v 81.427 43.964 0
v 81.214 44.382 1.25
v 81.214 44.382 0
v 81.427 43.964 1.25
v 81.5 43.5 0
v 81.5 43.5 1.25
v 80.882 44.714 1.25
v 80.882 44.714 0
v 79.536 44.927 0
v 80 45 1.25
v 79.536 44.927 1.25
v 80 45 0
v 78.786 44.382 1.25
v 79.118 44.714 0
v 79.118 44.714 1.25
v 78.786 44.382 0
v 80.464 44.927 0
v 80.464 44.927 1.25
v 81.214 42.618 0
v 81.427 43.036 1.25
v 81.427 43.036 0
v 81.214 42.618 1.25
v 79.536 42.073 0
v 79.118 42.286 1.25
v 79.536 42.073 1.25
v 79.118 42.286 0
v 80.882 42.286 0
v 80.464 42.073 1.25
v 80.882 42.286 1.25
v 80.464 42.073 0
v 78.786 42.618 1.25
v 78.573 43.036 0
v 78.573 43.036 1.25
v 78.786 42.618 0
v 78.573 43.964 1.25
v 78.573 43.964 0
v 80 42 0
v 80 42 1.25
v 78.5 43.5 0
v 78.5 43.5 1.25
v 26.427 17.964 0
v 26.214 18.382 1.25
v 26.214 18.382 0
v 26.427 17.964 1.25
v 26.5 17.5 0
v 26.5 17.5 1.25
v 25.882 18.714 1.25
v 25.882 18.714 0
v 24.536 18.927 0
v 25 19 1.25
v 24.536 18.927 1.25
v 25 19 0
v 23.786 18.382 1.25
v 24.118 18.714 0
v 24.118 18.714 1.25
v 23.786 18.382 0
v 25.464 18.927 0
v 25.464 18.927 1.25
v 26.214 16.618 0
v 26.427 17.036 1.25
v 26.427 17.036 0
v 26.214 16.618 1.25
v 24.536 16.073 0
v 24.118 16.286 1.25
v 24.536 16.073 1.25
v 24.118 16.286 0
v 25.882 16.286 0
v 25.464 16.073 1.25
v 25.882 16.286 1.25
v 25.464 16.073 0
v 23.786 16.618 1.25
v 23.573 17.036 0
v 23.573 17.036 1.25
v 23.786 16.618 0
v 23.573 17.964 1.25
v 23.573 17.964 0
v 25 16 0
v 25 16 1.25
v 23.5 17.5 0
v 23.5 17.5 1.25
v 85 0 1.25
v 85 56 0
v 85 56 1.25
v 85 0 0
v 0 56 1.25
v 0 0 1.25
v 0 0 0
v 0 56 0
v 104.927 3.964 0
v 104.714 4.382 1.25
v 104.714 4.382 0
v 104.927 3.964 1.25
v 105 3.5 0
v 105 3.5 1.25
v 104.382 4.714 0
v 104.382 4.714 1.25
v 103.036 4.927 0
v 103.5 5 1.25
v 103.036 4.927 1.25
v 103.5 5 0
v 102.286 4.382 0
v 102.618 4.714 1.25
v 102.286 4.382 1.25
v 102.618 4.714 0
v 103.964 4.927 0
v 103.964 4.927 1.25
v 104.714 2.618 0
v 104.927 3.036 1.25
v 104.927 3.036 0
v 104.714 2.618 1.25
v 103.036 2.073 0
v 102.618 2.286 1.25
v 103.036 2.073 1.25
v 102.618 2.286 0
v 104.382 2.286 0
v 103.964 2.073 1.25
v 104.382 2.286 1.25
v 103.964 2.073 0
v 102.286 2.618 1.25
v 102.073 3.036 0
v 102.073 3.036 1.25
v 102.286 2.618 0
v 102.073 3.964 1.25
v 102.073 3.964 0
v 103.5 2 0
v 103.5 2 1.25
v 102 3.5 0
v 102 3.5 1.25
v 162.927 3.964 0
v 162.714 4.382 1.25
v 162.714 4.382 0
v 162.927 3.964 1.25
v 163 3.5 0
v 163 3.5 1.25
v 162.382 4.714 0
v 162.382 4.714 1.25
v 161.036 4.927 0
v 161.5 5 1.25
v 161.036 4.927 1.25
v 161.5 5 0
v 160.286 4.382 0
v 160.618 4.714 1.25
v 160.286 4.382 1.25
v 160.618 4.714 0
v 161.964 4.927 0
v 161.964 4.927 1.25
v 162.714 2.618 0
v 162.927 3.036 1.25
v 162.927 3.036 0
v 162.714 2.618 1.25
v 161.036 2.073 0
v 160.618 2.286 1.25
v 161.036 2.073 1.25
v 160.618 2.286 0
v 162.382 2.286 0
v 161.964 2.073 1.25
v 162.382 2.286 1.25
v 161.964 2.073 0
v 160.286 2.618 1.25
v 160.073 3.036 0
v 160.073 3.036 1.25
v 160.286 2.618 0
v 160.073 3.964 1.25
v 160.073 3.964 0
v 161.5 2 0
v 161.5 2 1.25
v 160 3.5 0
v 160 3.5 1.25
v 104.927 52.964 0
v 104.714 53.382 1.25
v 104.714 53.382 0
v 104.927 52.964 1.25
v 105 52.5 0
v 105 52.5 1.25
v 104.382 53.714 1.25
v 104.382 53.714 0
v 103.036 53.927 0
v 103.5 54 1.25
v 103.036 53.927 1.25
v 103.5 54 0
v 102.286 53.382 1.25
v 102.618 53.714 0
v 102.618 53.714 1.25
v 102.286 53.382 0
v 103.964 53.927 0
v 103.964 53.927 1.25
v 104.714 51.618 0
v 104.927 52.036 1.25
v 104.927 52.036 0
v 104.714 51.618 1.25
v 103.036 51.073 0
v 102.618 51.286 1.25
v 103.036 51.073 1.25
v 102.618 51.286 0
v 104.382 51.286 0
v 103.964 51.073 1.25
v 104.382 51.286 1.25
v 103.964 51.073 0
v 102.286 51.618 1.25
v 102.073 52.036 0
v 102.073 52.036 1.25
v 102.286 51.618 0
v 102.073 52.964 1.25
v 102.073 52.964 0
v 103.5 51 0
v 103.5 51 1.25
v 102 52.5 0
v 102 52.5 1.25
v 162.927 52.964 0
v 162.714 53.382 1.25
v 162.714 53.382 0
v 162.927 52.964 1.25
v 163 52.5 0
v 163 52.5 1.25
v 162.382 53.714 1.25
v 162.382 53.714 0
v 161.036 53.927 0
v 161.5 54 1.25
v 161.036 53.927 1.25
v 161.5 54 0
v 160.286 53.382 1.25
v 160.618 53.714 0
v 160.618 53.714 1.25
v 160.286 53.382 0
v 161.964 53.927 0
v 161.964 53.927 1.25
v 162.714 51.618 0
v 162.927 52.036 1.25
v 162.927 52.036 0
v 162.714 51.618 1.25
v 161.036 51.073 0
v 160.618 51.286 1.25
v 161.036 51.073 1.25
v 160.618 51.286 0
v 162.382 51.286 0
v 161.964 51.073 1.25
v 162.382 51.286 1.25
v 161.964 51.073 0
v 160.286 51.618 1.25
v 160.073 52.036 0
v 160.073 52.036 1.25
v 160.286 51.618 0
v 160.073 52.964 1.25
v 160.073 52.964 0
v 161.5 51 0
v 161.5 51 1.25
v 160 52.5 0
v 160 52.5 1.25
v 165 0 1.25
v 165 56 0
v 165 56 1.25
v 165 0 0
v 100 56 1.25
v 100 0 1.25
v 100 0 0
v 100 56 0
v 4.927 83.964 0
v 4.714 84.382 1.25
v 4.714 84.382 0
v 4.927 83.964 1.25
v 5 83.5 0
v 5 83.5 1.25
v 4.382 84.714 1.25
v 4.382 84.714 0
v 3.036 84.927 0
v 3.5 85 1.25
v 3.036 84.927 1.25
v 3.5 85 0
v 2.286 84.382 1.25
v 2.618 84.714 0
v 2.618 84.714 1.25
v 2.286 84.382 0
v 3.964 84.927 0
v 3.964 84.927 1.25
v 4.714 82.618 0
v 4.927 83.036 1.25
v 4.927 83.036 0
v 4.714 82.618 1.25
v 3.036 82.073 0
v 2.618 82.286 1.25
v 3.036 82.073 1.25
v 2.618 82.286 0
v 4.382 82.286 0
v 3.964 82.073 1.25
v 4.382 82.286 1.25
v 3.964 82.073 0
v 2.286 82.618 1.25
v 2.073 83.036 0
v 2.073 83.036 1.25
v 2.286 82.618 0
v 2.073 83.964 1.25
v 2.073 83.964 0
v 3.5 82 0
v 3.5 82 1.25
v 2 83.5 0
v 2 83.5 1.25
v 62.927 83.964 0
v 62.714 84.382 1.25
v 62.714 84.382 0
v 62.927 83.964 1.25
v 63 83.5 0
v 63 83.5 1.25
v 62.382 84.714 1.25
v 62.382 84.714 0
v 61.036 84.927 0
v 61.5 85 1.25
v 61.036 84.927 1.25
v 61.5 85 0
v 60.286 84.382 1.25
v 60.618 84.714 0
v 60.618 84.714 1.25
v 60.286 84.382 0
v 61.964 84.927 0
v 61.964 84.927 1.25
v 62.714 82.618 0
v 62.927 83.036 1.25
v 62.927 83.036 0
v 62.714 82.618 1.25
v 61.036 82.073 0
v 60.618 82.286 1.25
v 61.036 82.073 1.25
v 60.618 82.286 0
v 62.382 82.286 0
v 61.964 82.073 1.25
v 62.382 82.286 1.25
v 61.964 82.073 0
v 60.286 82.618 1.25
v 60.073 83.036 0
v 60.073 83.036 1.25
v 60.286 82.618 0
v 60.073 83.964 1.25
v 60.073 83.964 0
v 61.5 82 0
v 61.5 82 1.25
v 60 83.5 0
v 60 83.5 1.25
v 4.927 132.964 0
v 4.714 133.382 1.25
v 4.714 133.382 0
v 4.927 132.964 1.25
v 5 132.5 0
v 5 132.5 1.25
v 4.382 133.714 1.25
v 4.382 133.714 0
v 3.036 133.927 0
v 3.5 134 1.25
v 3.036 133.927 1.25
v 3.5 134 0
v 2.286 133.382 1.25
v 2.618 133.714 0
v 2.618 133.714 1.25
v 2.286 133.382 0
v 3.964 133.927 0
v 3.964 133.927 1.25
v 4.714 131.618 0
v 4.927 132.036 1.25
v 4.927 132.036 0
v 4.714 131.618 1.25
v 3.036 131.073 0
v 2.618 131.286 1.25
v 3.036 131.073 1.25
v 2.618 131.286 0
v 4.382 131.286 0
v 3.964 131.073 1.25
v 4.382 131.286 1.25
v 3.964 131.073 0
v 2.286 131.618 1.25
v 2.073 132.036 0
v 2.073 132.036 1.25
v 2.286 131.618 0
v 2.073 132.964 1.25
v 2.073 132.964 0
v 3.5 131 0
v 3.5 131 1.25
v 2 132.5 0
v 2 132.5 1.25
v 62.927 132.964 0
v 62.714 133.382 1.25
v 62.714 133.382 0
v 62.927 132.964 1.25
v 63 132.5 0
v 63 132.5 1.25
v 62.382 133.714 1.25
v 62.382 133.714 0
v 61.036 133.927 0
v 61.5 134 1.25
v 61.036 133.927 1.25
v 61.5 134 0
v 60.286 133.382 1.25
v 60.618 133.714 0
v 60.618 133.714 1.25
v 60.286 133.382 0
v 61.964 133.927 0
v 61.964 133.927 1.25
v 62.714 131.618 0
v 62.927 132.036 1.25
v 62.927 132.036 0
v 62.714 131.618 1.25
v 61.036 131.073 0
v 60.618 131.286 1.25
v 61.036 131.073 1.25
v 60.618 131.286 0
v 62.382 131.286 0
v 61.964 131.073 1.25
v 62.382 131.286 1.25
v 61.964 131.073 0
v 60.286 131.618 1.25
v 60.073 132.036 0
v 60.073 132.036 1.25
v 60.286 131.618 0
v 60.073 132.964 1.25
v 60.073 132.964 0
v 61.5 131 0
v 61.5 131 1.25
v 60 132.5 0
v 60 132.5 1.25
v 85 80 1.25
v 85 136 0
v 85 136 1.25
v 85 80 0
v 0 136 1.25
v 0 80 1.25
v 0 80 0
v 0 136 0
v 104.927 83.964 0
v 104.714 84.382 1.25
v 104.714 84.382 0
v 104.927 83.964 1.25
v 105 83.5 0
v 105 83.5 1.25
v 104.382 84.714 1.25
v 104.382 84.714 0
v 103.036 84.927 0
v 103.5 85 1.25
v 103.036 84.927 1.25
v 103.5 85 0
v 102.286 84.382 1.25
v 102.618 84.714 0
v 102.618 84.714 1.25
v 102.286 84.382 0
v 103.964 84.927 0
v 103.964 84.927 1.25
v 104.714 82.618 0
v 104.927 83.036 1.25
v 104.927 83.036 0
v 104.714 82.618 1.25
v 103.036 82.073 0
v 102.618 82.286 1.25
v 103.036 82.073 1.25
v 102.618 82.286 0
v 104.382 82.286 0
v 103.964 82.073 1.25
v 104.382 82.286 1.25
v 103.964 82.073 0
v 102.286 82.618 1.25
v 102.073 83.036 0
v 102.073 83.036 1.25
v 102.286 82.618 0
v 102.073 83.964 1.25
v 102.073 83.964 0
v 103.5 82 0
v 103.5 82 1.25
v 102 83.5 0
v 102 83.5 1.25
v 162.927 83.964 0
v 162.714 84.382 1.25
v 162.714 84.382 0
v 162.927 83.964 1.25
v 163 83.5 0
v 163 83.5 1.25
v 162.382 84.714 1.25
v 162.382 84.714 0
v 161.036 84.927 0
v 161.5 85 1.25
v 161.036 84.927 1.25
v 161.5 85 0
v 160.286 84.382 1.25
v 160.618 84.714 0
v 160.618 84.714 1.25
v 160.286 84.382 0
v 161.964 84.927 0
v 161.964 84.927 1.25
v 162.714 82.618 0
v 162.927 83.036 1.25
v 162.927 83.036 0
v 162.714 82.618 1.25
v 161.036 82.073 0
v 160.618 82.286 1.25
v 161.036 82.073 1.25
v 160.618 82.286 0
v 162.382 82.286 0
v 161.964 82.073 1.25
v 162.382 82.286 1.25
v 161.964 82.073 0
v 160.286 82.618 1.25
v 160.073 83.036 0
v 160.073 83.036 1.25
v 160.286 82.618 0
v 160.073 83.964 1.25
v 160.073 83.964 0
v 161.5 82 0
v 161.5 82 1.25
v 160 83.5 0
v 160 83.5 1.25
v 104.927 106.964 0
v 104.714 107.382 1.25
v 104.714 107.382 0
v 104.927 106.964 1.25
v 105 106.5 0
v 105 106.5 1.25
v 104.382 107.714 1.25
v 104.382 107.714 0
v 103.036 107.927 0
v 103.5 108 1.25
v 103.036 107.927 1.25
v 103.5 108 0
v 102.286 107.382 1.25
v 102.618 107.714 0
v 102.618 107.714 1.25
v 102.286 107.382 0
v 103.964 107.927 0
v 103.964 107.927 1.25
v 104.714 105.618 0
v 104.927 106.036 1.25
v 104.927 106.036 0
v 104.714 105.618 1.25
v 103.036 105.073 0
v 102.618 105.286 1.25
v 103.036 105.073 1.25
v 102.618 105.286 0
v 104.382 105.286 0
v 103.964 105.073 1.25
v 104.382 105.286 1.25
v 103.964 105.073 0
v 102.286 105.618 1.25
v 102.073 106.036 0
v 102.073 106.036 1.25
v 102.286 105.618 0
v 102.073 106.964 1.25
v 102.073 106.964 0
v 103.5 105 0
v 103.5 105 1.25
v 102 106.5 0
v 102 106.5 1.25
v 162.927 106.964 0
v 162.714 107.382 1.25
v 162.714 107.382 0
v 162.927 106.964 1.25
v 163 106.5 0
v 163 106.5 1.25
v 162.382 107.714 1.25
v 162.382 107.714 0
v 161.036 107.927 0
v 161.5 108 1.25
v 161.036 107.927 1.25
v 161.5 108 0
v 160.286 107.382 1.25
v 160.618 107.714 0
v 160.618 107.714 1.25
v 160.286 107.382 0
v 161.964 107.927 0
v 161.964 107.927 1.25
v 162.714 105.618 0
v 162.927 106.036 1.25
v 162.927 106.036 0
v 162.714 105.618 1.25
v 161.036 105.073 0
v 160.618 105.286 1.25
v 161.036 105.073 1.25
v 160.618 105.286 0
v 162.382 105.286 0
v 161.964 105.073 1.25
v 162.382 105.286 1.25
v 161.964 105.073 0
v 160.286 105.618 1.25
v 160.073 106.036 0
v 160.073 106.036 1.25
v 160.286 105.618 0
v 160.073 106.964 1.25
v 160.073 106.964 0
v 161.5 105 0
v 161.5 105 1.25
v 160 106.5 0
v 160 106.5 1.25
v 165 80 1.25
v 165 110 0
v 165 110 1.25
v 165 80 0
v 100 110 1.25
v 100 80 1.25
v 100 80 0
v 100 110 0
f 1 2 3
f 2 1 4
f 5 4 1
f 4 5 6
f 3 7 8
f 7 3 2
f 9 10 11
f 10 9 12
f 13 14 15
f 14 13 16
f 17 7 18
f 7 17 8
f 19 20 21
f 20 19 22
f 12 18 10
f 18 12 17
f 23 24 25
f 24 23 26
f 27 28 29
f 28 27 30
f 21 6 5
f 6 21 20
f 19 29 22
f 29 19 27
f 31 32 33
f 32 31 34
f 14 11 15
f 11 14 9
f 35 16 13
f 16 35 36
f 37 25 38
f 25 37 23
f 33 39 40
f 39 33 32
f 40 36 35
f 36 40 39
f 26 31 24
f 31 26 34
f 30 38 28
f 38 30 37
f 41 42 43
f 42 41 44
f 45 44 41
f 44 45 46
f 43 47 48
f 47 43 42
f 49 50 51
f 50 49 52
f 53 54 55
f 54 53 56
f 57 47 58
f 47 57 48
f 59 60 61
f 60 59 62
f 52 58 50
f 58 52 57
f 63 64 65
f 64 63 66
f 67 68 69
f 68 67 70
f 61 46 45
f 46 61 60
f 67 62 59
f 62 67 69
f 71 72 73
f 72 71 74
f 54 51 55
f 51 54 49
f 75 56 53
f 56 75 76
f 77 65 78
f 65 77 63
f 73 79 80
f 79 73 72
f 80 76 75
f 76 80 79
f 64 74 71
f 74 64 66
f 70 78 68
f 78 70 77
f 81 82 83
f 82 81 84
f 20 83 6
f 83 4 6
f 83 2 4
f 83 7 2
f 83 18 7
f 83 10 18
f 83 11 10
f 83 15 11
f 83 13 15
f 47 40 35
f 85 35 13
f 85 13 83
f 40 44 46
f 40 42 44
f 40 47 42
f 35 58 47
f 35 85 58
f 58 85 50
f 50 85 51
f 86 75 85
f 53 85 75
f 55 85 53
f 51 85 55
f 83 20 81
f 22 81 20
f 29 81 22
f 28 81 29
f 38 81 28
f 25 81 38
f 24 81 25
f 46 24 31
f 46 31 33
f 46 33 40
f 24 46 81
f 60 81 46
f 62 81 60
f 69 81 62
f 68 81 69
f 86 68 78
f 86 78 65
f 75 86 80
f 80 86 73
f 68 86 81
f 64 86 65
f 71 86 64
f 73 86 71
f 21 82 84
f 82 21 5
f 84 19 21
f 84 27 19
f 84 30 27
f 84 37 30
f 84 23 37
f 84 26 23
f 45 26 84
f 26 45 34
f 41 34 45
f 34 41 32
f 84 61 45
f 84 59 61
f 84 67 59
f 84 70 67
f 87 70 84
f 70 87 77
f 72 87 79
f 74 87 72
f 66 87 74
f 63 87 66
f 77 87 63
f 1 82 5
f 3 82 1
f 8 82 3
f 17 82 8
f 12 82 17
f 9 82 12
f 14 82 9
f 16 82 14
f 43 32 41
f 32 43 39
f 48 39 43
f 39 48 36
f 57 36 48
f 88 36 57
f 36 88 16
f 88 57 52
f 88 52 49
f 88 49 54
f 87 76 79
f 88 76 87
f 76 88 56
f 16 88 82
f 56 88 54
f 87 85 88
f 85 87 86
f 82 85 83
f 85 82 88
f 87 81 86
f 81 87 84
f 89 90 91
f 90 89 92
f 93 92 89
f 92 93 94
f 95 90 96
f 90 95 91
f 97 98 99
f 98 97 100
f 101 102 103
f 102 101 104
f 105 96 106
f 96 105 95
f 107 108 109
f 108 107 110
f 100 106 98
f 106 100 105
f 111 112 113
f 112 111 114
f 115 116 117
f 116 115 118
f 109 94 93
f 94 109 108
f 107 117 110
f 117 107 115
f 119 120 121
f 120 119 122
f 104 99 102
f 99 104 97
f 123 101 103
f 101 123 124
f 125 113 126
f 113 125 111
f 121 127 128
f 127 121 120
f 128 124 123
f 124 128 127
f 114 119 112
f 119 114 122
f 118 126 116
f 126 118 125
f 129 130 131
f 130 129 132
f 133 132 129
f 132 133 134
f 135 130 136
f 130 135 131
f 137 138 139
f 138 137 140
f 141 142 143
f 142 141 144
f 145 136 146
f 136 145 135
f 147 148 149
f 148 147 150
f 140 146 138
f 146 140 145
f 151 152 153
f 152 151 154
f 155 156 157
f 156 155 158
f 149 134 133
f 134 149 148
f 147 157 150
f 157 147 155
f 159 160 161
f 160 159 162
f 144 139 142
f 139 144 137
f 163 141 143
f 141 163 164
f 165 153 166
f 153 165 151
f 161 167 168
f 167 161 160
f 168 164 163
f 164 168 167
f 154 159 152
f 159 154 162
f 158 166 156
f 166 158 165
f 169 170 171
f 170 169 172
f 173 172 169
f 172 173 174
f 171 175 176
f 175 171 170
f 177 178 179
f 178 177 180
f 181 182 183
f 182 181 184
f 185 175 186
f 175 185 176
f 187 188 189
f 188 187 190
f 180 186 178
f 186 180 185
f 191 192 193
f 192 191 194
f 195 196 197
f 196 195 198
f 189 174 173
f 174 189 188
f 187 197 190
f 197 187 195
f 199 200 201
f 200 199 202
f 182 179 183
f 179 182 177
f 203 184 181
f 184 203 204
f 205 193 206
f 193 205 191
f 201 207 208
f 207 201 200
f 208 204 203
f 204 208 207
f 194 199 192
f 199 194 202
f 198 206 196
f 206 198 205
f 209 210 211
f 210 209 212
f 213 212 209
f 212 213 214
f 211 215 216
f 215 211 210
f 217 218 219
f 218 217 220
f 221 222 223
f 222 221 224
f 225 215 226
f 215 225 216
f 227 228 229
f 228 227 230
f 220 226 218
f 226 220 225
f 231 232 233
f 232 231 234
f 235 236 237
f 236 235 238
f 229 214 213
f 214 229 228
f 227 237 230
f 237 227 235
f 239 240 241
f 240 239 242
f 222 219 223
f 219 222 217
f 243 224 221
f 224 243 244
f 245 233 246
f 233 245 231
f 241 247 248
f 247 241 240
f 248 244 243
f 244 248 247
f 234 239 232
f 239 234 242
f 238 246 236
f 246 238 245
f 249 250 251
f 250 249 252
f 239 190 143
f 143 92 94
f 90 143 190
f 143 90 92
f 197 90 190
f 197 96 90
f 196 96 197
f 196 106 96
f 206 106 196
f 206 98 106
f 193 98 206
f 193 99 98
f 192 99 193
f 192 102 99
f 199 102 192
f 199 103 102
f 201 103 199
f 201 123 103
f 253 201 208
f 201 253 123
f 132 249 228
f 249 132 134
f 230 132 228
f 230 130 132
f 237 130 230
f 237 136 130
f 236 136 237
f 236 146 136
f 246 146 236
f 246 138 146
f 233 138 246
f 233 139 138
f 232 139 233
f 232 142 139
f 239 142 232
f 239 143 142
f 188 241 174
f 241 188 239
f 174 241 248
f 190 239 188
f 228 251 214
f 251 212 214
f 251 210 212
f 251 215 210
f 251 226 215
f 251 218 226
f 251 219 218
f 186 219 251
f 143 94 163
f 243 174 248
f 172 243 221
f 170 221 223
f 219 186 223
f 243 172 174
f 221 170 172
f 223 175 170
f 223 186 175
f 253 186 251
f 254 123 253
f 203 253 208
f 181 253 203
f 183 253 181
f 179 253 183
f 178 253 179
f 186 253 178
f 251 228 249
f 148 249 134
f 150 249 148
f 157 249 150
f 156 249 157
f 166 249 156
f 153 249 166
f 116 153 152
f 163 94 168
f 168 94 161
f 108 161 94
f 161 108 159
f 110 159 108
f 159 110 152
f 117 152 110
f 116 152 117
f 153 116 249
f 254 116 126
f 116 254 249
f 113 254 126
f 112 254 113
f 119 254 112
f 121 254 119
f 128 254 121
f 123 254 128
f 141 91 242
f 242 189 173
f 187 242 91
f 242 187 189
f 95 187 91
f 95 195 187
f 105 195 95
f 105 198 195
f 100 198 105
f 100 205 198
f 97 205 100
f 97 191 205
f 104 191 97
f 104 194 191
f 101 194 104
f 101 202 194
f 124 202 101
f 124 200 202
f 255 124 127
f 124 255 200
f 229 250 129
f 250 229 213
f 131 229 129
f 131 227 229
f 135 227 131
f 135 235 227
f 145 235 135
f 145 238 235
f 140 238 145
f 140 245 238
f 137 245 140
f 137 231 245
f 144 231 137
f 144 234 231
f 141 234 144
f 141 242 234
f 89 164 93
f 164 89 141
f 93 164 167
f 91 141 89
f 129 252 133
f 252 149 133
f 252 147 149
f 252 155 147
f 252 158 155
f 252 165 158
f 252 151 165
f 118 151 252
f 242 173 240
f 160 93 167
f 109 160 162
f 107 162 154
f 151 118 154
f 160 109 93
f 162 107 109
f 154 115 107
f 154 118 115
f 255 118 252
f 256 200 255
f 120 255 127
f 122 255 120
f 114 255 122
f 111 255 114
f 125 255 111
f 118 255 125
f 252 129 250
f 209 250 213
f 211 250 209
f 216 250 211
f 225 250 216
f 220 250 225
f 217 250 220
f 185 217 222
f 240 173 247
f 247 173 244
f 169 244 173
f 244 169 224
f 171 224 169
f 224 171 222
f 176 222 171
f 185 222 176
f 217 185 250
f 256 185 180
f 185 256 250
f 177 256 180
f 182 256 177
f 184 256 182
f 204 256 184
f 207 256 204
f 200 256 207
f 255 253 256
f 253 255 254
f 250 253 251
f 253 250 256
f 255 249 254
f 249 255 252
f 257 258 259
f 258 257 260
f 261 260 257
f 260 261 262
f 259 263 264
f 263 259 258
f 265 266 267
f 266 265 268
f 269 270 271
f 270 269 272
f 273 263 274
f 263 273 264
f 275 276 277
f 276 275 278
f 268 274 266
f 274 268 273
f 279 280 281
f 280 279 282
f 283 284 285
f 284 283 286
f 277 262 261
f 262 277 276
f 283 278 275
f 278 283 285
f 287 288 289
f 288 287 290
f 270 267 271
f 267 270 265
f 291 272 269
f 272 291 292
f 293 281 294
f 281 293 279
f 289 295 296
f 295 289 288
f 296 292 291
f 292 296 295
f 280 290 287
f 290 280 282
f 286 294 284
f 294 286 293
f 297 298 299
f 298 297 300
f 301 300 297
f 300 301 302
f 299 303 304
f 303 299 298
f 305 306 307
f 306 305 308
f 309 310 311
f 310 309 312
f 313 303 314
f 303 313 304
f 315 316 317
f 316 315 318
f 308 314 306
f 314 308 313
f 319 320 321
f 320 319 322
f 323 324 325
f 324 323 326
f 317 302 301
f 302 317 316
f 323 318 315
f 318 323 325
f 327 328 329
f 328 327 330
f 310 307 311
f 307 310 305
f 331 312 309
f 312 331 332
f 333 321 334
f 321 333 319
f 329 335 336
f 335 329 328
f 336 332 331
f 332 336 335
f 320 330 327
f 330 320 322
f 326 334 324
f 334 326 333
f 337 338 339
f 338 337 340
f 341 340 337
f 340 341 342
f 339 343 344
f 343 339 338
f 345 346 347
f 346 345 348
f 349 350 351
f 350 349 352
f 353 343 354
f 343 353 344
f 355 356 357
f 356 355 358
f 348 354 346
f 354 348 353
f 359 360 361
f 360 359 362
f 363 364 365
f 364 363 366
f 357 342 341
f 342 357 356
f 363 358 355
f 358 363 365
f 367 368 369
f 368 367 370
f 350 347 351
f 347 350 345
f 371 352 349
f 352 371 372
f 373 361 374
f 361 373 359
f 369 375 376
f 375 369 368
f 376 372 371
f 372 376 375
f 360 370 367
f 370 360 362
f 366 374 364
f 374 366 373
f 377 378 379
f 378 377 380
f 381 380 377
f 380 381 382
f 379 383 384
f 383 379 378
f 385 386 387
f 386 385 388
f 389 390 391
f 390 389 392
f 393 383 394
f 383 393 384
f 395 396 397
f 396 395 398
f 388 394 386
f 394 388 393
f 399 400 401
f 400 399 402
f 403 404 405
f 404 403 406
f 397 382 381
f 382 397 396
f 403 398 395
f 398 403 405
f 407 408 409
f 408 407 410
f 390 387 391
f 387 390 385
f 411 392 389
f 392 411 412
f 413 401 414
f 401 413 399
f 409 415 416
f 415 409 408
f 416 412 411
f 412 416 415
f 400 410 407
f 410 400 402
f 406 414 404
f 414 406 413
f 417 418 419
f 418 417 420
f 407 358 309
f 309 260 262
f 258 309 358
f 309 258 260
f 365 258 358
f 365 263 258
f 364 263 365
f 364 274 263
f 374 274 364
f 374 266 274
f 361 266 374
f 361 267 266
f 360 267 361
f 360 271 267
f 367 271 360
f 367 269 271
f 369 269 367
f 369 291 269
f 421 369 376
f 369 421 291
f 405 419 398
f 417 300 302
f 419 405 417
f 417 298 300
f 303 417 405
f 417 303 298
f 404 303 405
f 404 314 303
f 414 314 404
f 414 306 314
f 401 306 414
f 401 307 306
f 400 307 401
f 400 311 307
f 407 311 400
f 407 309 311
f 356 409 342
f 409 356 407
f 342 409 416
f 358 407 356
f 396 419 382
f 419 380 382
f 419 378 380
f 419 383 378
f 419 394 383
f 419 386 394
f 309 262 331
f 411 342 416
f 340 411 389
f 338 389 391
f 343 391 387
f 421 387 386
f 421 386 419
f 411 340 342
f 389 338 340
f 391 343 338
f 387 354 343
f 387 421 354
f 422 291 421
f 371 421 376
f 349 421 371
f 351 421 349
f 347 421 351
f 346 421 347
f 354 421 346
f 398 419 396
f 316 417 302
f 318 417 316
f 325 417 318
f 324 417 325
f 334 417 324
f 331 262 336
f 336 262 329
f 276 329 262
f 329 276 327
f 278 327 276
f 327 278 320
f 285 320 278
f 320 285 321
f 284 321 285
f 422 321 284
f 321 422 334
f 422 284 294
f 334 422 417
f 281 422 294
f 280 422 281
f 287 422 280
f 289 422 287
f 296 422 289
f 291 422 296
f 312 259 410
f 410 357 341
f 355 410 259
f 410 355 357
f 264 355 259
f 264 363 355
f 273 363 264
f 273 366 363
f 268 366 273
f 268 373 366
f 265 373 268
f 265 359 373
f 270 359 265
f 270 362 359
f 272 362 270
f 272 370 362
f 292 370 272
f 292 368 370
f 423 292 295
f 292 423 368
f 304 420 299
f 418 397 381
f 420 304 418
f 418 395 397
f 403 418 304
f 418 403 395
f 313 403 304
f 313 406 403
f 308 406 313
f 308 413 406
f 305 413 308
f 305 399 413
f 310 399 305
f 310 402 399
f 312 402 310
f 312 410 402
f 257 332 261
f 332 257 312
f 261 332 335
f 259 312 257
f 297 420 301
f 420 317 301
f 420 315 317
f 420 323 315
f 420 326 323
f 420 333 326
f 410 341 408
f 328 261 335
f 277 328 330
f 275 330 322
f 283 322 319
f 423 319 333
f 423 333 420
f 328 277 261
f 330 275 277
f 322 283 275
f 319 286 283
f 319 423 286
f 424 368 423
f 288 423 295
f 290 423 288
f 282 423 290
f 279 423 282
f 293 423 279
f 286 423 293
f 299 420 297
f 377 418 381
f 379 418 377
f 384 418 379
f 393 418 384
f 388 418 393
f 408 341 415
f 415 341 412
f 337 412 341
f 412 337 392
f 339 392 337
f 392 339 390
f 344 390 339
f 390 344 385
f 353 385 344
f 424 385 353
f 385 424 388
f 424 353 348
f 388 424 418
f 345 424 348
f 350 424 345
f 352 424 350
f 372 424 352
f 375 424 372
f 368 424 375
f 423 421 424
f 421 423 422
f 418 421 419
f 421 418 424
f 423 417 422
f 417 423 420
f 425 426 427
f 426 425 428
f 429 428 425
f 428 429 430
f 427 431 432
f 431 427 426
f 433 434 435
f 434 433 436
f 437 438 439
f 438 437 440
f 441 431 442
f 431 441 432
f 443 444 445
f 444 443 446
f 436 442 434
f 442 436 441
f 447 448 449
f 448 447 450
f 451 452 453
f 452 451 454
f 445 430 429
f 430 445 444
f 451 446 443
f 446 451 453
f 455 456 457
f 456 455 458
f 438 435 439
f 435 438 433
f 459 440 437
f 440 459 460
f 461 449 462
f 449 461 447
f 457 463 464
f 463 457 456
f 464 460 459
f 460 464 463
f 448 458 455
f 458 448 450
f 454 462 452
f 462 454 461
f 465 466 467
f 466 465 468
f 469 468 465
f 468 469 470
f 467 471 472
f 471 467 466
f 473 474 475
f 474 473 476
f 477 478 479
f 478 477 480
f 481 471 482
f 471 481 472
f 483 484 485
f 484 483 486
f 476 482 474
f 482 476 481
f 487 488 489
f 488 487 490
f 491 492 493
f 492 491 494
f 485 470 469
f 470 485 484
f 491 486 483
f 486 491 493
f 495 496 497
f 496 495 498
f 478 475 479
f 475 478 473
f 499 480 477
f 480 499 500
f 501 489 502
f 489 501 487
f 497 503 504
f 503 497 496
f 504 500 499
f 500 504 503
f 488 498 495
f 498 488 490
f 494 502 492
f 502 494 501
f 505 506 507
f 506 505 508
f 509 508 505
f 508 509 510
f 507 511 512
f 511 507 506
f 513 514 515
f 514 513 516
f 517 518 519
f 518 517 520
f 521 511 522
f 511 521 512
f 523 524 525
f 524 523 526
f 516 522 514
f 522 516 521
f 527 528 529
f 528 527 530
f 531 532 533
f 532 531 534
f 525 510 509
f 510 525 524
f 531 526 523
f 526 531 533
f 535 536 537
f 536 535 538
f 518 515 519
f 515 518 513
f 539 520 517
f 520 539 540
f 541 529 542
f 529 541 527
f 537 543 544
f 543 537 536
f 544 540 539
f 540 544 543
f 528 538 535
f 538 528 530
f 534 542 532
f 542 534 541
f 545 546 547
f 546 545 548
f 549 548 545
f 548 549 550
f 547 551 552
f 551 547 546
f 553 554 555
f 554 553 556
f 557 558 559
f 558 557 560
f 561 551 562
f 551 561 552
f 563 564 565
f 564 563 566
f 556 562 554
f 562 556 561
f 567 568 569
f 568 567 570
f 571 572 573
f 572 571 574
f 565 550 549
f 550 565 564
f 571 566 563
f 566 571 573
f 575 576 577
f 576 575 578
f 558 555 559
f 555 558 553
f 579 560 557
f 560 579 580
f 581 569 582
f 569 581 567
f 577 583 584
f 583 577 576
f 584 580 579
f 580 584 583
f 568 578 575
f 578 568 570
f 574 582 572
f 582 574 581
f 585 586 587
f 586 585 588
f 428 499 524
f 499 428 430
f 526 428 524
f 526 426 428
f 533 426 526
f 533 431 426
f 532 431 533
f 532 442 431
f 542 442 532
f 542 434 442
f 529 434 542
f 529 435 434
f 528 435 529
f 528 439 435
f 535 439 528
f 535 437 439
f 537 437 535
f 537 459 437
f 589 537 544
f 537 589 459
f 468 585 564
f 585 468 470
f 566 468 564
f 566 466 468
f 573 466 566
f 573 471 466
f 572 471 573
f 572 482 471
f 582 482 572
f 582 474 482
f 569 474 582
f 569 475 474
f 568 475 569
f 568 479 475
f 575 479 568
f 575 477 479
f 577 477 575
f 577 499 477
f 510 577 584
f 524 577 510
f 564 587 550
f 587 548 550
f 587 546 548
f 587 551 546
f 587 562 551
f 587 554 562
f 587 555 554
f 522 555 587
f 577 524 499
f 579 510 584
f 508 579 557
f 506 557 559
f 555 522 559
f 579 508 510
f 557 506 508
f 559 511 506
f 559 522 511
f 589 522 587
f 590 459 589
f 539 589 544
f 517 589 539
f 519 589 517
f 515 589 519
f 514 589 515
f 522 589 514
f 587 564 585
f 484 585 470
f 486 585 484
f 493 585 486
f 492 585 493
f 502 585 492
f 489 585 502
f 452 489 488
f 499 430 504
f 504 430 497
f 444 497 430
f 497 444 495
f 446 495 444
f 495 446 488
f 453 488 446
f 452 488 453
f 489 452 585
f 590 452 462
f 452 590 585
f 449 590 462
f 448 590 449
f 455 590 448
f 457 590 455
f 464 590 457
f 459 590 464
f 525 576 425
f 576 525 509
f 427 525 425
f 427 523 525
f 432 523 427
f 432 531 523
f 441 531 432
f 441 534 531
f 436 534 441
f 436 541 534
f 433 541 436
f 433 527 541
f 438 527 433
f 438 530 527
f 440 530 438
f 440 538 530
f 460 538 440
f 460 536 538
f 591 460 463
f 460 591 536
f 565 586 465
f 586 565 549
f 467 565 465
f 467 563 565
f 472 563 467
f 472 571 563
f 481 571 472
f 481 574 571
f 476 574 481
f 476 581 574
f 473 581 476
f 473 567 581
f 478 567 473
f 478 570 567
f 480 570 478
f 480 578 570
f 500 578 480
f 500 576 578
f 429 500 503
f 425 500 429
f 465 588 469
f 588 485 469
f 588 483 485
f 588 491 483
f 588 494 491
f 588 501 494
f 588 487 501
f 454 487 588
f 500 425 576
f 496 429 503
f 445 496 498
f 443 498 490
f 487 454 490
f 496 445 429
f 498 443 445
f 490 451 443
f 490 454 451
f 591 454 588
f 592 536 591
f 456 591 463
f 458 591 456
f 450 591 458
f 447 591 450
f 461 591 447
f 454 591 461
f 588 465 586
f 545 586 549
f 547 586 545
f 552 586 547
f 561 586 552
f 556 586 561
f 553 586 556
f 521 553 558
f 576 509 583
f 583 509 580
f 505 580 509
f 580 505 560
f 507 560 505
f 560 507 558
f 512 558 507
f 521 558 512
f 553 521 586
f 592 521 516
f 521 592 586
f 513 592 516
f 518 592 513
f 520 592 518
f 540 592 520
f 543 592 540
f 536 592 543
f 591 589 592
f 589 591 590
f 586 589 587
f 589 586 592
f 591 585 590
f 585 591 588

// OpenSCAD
//Shut your Pi Hole! 
//An OpenSCAD library to assist with designing Raspberry Pi accessories

//This work is licensed under the Creative Commons Attribution-ShareAlike 4.0 International License. To view a copy of this license, visit http://creativecommons.org/licenses/by-sa/4.0/.
//© 2016 Dale Price

//Pi dimensions sourced from https://www.raspberrypi.org/documentation/hardware/raspberrypi/mechanical/
//Currently supports "1B", "1A+", "1B+", "2B", "3B", "Zero"

//Pi hole diameter plus a tiny bit extra to account for shrinkage when 3D printing
piHoleD = 2.9;


//get vector of [x,y] vectors of locations of mounting holes based on Pi version
function piHoleLocations (board="3B") = 
	(board=="1A+" || board=="1B+" || board=="2B" || board=="3B") ?
		[[3.5, 3.5], [61.5, 3.5], [3.5, 52.5], [61.5, 52.5]] : //pi 1B+, 2B, 3B
	(board=="Zero") ?
		[[3.5, 3.5], [61.5, 3.5], [3.5, 26.5], [61.5, 26.5]] : //pi zero
	(board=="1B") ?
		[[80, 43.5], [25, 17.5]] :
	[]; //invalid board

//get vector of [x,y,z] dimensions of board
//	dimensions are for PCB only, not ports or anything else
function piBoardDim (board="3B") =
	(board=="1B" || board=="1B+" || board=="2B" || board=="3B") ?
		[85, 56, 1.25] :
	(board=="Zero") ?
		[65, 30, 1.25] :
	(board == "1A+") ?
		[65, 56, 1.25] :
	[0,0,0];

//Mounting holes for a Raspberry Pi of the specified version
//	Parameters
//		board: the version of the raspberry pi to generate holes for
//		depth: the depth of the holes in mm
module piHoles (board, depth = 5, preview=true) {
	//preview of the board itself
	if(preview==true)
		% piBoard(board);
	
	//mounting holes
	for(holePos = piHoleLocations(board)) {
		translate([holePos[0], holePos[1], -depth]) cylinder(d=piHoleD + 0.1, h=2*depth);
	}
}

//Preview of board dimensions for Raspberry Pi of the specified version
module piBoard (board) {
	difference() {
		cube(piBoardDim(board), center=false);
		translate([0,0,piBoardDim(board)[2] + 0.01]) piHoles(board, piBoardDim(board)[2] + 0.02, false);
	}

	//warn about possible inaccuracy of boards that don't currently have official documentation
	if(board == "1B") {
		echo("CAUTION: The mounting hole positions for the board you have selected may not be accurate because the Raspberry Pi Foundation does not currently provide official mechanical drawings for it.");
	}
}

//Snap-fit posts for mounting the Raspberry Pi
//	Parameters
//		board: version of the raspberry pi to mount
//		height: height of the top surface of the raspberry pi board off the base of the posts
//		preview: whether or not to show a preview of the board in place
module piPosts(board, height=5, preview=true) {
	piSize = piBoardDim(board);
	piHolePos = piHoleLocations(board);

	module pcbPost(height) {
		cylinder(d=2, h=height);
		cylinder(d1=5, d2=2, h=height - piSize[2] - 0.25);

		translate([0, 0.4, height]) scale([1.1, 1.1, 1]) cylinder(d=2, h=0.5);
	}
	
	for(holePos = piHolePos) {
		translate([holePos[0], holePos[1], 0]) pcbPost(height);
	}

	if(preview==true)
		% translate([0,0,height-piSize[2]]) piBoard(board);
}

//Generic stands of arbitrary height
//	Parameters
//		height: stand height
module pcbStand(height) {
	difference() {
		cylinder(d=7, h=height);
		translate([0, 0, -1]) cylinder(d=piHoleD + 0.42, h=height+2);
	}
}

//Pass-through stands for mounting the Raspberry Pi
//	Parameters
//		board: version of the raspberry pi to mount
//		height: height of the top surface of the raspberry pi board off the base of the posts
//		preview: whether or not to show a preview of the board in place
module piStands(board, height=5, preview=true) {
	piSize = piBoardDim(board);
	piHolePos = piHoleLocations(board);

	for(holePos = piHolePos) {
		translate([holePos[0], holePos[1], 0]) pcbStand(height);
	}

	if(preview==true)
		% translate([0,0,height-piSize[2]]) piBoard(board);
}

//baseplate (or top cover) for board enclosure
//	ext is the added dimension in mm
//	h is the thickness in mm
module piPlate (board="3B", ext=4, h=2) {
	let (
		base=[
			piBoardDim(board)[0] + ext * 2,
			piBoardDim(board)[1] + ext * 2,
			h
		],
		bh = piBoardDim(board)[2]
	)
	difference() {
		translate([-ext,-ext,-h]) cube(base, center=false);
		translate([0,0,1]) piHoles(board, h + 2, false);
	}

	//warn about possible inaccuracy of boards that don't currently have official documentation
	if(board == "1B") {
		echo("CAUTION: The mounting hole positions for the board you have selected may not be accurate because the Raspberry Pi Foundation does not currently provide official mechanical drawings for it.");
	}
}


//walls on baseplate for board enclosure
//	ext is the added dimension in mm
//	thick is the thickness in mm (inwards)
//	h is the height in mm
//	if top > 0 consider this a top cover and extend walls down from "top"
module piPlateWalls(board="3B", ext=4, thick=2, h=10, top=0) {
	outer=[
		piBoardDim(board)[0] + ext * 2,
		piBoardDim(board)[1] + ext * 2,
		h
	];
	inner=[
		piBoardDim(board)[0] + (ext - thick) * 2,
		piBoardDim(board)[1] + (ext - thick) * 2,
		h + 2
	];
	dh = top > 0 ? (h + top) : 0;
	translate([0, 0, -dh]) difference() {
		translate([-ext,-ext,0]) cube(outer, center=false);
		translate([-(ext - thick),-(ext - thick),-1]) cube(inner, center=false);;
	}
}

//partial walls on baseplate for board enclosure
//	ext is the added dimension in mm
//	thick is the thickness in mm (inwards)
//	size is the corner space to skip in mm
//	h is the height in mm
//	if top > 0 consider this a top cover and extend walls down from "top"
module piPlatePartialWalls(board="3B", ext=4, thick=2, h=10, size=10, top=0) {
	innerX=[
		piBoardDim(board)[0] + (ext * 2) - (size * 2),
		piBoardDim(board)[1] + (ext * 2) + 2,
		h + 2
	];
	innerY=[
		piBoardDim(board)[0] + (ext * 2) + 2,
		piBoardDim(board)[1] + (ext * 2) - (size * 2),
		h + 2
	];
	dh = top > 0 ? (h + top) : 0;
	translate([0, 0, -dh]) intersection() {
		piPlateWalls(board, ext, thick, h);
		union() {
			translate([size-ext,-ext-1,-1]) cube(innerX, center=false);
			translate([-ext-1,size-ext,-1]) cube(innerY, center=false);
		}
	}
}

//corners on baseplate for board enclosure
//	ext is the added dimension in mm
//	thick is the thickness in mm (inwards)
//	h is the height in mm
//	size is the corner size in mm
//	if top > 0 consider this a top cover and extend walls down from "top"
module piPlateCorners(board="3B", ext=4, thick=2, h=10, size=10, top=0) {
	innerX=[
		piBoardDim(board)[0] + (ext * 2) - (size * 2),
		piBoardDim(board)[1] + (ext * 2) + 2,
		h + 2
	];
	innerY=[
		piBoardDim(board)[0] + (ext * 2) + 2,
		piBoardDim(board)[1] + (ext * 2) - (size * 2),
		h + 2
	];
	dh = top > 0 ? (h + top) : 0;
	translate([0, 0, -dh]) difference() {
		piPlateWalls(board, ext, thick, h);
		{
			translate([size-ext,-ext-1,-1]) cube(innerX, center=false);
			translate([-ext-1,size-ext,-1]) cube(innerY, center=false);
		}
	}
}

color("DarkGreen", 1, $fn=20) {
	piBoard("1B");
	translate([100,0,0]) piBoard("1A+");
	translate([0,80,0]) piBoard("2B");
	translate([100,80,0]) piBoard("Zero");
}
